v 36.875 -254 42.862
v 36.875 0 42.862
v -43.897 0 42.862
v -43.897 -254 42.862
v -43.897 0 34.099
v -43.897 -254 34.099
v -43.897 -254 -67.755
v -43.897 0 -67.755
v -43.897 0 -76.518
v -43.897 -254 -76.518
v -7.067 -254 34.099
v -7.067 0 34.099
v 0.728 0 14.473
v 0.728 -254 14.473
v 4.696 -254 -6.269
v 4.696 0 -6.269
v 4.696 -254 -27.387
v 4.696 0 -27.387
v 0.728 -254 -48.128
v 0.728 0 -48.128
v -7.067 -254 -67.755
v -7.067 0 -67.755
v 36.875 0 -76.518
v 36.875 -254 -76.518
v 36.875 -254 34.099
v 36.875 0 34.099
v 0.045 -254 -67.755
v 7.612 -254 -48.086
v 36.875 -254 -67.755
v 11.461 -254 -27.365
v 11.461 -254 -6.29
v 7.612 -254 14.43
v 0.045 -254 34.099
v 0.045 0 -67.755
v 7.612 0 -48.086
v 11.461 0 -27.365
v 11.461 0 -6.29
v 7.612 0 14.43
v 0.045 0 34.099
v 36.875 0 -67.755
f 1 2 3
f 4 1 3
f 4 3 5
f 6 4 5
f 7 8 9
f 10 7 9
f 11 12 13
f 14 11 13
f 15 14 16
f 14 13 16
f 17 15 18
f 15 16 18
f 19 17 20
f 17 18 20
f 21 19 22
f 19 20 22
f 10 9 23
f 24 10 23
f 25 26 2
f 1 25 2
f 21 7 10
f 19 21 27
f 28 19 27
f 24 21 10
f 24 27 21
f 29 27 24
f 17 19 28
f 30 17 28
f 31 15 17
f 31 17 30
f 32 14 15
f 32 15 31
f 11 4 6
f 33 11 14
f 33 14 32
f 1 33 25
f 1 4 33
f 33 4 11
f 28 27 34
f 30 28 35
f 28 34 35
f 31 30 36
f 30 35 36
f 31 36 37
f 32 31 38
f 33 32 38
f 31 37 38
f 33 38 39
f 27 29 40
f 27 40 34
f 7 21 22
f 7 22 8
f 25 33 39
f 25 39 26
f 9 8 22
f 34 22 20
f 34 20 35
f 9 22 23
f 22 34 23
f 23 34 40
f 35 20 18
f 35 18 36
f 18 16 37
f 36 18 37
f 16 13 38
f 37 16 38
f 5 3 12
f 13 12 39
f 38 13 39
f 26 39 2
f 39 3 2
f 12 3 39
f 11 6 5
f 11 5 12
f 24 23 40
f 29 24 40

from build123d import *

# Parameters (mm, degrees)
F1_DEPTH = 254


with BuildPart() as f1:
    # F0 (on Front) → F1 (new body)
    with BuildSketch(Plane.XZ):
        with BuildLine():
            Line((36.874757, 42.862148), (-43.897243, 42.862148))
            Line((-43.897243, 42.862148), (-43.897243, 34.099148))
            Line((-43.897243, 34.099148), (-7.067243, 34.099148))
            ThreePointArc((-7.067243, 34.099148), (5.195877, -16.827852), (-7.067243, -67.754852))
            Line((-7.067243, -67.754852), (-43.897243, -67.754852))
            Line((-43.897243, -67.754852), (-43.897243, -76.517852))
            Line((-43.897243, -76.517852), (36.874757, -76.517852))
            Line((36.874757, -76.517852), (36.874757, -67.754852))
            Line((36.874757, -67.754852), (0.044757, -67.754852))
            ThreePointArc((0.044757, -67.754852), (11.944951, -16.827852), (0.044757, 34.099148))
            Line((0.044757, 34.099148), (36.874757, 34.099148))
            Line((36.874757, 34.099148), (36.874757, 42.862148))
        make_face()
    extrude(amount=F1_DEPTH)


solid = f1.part
